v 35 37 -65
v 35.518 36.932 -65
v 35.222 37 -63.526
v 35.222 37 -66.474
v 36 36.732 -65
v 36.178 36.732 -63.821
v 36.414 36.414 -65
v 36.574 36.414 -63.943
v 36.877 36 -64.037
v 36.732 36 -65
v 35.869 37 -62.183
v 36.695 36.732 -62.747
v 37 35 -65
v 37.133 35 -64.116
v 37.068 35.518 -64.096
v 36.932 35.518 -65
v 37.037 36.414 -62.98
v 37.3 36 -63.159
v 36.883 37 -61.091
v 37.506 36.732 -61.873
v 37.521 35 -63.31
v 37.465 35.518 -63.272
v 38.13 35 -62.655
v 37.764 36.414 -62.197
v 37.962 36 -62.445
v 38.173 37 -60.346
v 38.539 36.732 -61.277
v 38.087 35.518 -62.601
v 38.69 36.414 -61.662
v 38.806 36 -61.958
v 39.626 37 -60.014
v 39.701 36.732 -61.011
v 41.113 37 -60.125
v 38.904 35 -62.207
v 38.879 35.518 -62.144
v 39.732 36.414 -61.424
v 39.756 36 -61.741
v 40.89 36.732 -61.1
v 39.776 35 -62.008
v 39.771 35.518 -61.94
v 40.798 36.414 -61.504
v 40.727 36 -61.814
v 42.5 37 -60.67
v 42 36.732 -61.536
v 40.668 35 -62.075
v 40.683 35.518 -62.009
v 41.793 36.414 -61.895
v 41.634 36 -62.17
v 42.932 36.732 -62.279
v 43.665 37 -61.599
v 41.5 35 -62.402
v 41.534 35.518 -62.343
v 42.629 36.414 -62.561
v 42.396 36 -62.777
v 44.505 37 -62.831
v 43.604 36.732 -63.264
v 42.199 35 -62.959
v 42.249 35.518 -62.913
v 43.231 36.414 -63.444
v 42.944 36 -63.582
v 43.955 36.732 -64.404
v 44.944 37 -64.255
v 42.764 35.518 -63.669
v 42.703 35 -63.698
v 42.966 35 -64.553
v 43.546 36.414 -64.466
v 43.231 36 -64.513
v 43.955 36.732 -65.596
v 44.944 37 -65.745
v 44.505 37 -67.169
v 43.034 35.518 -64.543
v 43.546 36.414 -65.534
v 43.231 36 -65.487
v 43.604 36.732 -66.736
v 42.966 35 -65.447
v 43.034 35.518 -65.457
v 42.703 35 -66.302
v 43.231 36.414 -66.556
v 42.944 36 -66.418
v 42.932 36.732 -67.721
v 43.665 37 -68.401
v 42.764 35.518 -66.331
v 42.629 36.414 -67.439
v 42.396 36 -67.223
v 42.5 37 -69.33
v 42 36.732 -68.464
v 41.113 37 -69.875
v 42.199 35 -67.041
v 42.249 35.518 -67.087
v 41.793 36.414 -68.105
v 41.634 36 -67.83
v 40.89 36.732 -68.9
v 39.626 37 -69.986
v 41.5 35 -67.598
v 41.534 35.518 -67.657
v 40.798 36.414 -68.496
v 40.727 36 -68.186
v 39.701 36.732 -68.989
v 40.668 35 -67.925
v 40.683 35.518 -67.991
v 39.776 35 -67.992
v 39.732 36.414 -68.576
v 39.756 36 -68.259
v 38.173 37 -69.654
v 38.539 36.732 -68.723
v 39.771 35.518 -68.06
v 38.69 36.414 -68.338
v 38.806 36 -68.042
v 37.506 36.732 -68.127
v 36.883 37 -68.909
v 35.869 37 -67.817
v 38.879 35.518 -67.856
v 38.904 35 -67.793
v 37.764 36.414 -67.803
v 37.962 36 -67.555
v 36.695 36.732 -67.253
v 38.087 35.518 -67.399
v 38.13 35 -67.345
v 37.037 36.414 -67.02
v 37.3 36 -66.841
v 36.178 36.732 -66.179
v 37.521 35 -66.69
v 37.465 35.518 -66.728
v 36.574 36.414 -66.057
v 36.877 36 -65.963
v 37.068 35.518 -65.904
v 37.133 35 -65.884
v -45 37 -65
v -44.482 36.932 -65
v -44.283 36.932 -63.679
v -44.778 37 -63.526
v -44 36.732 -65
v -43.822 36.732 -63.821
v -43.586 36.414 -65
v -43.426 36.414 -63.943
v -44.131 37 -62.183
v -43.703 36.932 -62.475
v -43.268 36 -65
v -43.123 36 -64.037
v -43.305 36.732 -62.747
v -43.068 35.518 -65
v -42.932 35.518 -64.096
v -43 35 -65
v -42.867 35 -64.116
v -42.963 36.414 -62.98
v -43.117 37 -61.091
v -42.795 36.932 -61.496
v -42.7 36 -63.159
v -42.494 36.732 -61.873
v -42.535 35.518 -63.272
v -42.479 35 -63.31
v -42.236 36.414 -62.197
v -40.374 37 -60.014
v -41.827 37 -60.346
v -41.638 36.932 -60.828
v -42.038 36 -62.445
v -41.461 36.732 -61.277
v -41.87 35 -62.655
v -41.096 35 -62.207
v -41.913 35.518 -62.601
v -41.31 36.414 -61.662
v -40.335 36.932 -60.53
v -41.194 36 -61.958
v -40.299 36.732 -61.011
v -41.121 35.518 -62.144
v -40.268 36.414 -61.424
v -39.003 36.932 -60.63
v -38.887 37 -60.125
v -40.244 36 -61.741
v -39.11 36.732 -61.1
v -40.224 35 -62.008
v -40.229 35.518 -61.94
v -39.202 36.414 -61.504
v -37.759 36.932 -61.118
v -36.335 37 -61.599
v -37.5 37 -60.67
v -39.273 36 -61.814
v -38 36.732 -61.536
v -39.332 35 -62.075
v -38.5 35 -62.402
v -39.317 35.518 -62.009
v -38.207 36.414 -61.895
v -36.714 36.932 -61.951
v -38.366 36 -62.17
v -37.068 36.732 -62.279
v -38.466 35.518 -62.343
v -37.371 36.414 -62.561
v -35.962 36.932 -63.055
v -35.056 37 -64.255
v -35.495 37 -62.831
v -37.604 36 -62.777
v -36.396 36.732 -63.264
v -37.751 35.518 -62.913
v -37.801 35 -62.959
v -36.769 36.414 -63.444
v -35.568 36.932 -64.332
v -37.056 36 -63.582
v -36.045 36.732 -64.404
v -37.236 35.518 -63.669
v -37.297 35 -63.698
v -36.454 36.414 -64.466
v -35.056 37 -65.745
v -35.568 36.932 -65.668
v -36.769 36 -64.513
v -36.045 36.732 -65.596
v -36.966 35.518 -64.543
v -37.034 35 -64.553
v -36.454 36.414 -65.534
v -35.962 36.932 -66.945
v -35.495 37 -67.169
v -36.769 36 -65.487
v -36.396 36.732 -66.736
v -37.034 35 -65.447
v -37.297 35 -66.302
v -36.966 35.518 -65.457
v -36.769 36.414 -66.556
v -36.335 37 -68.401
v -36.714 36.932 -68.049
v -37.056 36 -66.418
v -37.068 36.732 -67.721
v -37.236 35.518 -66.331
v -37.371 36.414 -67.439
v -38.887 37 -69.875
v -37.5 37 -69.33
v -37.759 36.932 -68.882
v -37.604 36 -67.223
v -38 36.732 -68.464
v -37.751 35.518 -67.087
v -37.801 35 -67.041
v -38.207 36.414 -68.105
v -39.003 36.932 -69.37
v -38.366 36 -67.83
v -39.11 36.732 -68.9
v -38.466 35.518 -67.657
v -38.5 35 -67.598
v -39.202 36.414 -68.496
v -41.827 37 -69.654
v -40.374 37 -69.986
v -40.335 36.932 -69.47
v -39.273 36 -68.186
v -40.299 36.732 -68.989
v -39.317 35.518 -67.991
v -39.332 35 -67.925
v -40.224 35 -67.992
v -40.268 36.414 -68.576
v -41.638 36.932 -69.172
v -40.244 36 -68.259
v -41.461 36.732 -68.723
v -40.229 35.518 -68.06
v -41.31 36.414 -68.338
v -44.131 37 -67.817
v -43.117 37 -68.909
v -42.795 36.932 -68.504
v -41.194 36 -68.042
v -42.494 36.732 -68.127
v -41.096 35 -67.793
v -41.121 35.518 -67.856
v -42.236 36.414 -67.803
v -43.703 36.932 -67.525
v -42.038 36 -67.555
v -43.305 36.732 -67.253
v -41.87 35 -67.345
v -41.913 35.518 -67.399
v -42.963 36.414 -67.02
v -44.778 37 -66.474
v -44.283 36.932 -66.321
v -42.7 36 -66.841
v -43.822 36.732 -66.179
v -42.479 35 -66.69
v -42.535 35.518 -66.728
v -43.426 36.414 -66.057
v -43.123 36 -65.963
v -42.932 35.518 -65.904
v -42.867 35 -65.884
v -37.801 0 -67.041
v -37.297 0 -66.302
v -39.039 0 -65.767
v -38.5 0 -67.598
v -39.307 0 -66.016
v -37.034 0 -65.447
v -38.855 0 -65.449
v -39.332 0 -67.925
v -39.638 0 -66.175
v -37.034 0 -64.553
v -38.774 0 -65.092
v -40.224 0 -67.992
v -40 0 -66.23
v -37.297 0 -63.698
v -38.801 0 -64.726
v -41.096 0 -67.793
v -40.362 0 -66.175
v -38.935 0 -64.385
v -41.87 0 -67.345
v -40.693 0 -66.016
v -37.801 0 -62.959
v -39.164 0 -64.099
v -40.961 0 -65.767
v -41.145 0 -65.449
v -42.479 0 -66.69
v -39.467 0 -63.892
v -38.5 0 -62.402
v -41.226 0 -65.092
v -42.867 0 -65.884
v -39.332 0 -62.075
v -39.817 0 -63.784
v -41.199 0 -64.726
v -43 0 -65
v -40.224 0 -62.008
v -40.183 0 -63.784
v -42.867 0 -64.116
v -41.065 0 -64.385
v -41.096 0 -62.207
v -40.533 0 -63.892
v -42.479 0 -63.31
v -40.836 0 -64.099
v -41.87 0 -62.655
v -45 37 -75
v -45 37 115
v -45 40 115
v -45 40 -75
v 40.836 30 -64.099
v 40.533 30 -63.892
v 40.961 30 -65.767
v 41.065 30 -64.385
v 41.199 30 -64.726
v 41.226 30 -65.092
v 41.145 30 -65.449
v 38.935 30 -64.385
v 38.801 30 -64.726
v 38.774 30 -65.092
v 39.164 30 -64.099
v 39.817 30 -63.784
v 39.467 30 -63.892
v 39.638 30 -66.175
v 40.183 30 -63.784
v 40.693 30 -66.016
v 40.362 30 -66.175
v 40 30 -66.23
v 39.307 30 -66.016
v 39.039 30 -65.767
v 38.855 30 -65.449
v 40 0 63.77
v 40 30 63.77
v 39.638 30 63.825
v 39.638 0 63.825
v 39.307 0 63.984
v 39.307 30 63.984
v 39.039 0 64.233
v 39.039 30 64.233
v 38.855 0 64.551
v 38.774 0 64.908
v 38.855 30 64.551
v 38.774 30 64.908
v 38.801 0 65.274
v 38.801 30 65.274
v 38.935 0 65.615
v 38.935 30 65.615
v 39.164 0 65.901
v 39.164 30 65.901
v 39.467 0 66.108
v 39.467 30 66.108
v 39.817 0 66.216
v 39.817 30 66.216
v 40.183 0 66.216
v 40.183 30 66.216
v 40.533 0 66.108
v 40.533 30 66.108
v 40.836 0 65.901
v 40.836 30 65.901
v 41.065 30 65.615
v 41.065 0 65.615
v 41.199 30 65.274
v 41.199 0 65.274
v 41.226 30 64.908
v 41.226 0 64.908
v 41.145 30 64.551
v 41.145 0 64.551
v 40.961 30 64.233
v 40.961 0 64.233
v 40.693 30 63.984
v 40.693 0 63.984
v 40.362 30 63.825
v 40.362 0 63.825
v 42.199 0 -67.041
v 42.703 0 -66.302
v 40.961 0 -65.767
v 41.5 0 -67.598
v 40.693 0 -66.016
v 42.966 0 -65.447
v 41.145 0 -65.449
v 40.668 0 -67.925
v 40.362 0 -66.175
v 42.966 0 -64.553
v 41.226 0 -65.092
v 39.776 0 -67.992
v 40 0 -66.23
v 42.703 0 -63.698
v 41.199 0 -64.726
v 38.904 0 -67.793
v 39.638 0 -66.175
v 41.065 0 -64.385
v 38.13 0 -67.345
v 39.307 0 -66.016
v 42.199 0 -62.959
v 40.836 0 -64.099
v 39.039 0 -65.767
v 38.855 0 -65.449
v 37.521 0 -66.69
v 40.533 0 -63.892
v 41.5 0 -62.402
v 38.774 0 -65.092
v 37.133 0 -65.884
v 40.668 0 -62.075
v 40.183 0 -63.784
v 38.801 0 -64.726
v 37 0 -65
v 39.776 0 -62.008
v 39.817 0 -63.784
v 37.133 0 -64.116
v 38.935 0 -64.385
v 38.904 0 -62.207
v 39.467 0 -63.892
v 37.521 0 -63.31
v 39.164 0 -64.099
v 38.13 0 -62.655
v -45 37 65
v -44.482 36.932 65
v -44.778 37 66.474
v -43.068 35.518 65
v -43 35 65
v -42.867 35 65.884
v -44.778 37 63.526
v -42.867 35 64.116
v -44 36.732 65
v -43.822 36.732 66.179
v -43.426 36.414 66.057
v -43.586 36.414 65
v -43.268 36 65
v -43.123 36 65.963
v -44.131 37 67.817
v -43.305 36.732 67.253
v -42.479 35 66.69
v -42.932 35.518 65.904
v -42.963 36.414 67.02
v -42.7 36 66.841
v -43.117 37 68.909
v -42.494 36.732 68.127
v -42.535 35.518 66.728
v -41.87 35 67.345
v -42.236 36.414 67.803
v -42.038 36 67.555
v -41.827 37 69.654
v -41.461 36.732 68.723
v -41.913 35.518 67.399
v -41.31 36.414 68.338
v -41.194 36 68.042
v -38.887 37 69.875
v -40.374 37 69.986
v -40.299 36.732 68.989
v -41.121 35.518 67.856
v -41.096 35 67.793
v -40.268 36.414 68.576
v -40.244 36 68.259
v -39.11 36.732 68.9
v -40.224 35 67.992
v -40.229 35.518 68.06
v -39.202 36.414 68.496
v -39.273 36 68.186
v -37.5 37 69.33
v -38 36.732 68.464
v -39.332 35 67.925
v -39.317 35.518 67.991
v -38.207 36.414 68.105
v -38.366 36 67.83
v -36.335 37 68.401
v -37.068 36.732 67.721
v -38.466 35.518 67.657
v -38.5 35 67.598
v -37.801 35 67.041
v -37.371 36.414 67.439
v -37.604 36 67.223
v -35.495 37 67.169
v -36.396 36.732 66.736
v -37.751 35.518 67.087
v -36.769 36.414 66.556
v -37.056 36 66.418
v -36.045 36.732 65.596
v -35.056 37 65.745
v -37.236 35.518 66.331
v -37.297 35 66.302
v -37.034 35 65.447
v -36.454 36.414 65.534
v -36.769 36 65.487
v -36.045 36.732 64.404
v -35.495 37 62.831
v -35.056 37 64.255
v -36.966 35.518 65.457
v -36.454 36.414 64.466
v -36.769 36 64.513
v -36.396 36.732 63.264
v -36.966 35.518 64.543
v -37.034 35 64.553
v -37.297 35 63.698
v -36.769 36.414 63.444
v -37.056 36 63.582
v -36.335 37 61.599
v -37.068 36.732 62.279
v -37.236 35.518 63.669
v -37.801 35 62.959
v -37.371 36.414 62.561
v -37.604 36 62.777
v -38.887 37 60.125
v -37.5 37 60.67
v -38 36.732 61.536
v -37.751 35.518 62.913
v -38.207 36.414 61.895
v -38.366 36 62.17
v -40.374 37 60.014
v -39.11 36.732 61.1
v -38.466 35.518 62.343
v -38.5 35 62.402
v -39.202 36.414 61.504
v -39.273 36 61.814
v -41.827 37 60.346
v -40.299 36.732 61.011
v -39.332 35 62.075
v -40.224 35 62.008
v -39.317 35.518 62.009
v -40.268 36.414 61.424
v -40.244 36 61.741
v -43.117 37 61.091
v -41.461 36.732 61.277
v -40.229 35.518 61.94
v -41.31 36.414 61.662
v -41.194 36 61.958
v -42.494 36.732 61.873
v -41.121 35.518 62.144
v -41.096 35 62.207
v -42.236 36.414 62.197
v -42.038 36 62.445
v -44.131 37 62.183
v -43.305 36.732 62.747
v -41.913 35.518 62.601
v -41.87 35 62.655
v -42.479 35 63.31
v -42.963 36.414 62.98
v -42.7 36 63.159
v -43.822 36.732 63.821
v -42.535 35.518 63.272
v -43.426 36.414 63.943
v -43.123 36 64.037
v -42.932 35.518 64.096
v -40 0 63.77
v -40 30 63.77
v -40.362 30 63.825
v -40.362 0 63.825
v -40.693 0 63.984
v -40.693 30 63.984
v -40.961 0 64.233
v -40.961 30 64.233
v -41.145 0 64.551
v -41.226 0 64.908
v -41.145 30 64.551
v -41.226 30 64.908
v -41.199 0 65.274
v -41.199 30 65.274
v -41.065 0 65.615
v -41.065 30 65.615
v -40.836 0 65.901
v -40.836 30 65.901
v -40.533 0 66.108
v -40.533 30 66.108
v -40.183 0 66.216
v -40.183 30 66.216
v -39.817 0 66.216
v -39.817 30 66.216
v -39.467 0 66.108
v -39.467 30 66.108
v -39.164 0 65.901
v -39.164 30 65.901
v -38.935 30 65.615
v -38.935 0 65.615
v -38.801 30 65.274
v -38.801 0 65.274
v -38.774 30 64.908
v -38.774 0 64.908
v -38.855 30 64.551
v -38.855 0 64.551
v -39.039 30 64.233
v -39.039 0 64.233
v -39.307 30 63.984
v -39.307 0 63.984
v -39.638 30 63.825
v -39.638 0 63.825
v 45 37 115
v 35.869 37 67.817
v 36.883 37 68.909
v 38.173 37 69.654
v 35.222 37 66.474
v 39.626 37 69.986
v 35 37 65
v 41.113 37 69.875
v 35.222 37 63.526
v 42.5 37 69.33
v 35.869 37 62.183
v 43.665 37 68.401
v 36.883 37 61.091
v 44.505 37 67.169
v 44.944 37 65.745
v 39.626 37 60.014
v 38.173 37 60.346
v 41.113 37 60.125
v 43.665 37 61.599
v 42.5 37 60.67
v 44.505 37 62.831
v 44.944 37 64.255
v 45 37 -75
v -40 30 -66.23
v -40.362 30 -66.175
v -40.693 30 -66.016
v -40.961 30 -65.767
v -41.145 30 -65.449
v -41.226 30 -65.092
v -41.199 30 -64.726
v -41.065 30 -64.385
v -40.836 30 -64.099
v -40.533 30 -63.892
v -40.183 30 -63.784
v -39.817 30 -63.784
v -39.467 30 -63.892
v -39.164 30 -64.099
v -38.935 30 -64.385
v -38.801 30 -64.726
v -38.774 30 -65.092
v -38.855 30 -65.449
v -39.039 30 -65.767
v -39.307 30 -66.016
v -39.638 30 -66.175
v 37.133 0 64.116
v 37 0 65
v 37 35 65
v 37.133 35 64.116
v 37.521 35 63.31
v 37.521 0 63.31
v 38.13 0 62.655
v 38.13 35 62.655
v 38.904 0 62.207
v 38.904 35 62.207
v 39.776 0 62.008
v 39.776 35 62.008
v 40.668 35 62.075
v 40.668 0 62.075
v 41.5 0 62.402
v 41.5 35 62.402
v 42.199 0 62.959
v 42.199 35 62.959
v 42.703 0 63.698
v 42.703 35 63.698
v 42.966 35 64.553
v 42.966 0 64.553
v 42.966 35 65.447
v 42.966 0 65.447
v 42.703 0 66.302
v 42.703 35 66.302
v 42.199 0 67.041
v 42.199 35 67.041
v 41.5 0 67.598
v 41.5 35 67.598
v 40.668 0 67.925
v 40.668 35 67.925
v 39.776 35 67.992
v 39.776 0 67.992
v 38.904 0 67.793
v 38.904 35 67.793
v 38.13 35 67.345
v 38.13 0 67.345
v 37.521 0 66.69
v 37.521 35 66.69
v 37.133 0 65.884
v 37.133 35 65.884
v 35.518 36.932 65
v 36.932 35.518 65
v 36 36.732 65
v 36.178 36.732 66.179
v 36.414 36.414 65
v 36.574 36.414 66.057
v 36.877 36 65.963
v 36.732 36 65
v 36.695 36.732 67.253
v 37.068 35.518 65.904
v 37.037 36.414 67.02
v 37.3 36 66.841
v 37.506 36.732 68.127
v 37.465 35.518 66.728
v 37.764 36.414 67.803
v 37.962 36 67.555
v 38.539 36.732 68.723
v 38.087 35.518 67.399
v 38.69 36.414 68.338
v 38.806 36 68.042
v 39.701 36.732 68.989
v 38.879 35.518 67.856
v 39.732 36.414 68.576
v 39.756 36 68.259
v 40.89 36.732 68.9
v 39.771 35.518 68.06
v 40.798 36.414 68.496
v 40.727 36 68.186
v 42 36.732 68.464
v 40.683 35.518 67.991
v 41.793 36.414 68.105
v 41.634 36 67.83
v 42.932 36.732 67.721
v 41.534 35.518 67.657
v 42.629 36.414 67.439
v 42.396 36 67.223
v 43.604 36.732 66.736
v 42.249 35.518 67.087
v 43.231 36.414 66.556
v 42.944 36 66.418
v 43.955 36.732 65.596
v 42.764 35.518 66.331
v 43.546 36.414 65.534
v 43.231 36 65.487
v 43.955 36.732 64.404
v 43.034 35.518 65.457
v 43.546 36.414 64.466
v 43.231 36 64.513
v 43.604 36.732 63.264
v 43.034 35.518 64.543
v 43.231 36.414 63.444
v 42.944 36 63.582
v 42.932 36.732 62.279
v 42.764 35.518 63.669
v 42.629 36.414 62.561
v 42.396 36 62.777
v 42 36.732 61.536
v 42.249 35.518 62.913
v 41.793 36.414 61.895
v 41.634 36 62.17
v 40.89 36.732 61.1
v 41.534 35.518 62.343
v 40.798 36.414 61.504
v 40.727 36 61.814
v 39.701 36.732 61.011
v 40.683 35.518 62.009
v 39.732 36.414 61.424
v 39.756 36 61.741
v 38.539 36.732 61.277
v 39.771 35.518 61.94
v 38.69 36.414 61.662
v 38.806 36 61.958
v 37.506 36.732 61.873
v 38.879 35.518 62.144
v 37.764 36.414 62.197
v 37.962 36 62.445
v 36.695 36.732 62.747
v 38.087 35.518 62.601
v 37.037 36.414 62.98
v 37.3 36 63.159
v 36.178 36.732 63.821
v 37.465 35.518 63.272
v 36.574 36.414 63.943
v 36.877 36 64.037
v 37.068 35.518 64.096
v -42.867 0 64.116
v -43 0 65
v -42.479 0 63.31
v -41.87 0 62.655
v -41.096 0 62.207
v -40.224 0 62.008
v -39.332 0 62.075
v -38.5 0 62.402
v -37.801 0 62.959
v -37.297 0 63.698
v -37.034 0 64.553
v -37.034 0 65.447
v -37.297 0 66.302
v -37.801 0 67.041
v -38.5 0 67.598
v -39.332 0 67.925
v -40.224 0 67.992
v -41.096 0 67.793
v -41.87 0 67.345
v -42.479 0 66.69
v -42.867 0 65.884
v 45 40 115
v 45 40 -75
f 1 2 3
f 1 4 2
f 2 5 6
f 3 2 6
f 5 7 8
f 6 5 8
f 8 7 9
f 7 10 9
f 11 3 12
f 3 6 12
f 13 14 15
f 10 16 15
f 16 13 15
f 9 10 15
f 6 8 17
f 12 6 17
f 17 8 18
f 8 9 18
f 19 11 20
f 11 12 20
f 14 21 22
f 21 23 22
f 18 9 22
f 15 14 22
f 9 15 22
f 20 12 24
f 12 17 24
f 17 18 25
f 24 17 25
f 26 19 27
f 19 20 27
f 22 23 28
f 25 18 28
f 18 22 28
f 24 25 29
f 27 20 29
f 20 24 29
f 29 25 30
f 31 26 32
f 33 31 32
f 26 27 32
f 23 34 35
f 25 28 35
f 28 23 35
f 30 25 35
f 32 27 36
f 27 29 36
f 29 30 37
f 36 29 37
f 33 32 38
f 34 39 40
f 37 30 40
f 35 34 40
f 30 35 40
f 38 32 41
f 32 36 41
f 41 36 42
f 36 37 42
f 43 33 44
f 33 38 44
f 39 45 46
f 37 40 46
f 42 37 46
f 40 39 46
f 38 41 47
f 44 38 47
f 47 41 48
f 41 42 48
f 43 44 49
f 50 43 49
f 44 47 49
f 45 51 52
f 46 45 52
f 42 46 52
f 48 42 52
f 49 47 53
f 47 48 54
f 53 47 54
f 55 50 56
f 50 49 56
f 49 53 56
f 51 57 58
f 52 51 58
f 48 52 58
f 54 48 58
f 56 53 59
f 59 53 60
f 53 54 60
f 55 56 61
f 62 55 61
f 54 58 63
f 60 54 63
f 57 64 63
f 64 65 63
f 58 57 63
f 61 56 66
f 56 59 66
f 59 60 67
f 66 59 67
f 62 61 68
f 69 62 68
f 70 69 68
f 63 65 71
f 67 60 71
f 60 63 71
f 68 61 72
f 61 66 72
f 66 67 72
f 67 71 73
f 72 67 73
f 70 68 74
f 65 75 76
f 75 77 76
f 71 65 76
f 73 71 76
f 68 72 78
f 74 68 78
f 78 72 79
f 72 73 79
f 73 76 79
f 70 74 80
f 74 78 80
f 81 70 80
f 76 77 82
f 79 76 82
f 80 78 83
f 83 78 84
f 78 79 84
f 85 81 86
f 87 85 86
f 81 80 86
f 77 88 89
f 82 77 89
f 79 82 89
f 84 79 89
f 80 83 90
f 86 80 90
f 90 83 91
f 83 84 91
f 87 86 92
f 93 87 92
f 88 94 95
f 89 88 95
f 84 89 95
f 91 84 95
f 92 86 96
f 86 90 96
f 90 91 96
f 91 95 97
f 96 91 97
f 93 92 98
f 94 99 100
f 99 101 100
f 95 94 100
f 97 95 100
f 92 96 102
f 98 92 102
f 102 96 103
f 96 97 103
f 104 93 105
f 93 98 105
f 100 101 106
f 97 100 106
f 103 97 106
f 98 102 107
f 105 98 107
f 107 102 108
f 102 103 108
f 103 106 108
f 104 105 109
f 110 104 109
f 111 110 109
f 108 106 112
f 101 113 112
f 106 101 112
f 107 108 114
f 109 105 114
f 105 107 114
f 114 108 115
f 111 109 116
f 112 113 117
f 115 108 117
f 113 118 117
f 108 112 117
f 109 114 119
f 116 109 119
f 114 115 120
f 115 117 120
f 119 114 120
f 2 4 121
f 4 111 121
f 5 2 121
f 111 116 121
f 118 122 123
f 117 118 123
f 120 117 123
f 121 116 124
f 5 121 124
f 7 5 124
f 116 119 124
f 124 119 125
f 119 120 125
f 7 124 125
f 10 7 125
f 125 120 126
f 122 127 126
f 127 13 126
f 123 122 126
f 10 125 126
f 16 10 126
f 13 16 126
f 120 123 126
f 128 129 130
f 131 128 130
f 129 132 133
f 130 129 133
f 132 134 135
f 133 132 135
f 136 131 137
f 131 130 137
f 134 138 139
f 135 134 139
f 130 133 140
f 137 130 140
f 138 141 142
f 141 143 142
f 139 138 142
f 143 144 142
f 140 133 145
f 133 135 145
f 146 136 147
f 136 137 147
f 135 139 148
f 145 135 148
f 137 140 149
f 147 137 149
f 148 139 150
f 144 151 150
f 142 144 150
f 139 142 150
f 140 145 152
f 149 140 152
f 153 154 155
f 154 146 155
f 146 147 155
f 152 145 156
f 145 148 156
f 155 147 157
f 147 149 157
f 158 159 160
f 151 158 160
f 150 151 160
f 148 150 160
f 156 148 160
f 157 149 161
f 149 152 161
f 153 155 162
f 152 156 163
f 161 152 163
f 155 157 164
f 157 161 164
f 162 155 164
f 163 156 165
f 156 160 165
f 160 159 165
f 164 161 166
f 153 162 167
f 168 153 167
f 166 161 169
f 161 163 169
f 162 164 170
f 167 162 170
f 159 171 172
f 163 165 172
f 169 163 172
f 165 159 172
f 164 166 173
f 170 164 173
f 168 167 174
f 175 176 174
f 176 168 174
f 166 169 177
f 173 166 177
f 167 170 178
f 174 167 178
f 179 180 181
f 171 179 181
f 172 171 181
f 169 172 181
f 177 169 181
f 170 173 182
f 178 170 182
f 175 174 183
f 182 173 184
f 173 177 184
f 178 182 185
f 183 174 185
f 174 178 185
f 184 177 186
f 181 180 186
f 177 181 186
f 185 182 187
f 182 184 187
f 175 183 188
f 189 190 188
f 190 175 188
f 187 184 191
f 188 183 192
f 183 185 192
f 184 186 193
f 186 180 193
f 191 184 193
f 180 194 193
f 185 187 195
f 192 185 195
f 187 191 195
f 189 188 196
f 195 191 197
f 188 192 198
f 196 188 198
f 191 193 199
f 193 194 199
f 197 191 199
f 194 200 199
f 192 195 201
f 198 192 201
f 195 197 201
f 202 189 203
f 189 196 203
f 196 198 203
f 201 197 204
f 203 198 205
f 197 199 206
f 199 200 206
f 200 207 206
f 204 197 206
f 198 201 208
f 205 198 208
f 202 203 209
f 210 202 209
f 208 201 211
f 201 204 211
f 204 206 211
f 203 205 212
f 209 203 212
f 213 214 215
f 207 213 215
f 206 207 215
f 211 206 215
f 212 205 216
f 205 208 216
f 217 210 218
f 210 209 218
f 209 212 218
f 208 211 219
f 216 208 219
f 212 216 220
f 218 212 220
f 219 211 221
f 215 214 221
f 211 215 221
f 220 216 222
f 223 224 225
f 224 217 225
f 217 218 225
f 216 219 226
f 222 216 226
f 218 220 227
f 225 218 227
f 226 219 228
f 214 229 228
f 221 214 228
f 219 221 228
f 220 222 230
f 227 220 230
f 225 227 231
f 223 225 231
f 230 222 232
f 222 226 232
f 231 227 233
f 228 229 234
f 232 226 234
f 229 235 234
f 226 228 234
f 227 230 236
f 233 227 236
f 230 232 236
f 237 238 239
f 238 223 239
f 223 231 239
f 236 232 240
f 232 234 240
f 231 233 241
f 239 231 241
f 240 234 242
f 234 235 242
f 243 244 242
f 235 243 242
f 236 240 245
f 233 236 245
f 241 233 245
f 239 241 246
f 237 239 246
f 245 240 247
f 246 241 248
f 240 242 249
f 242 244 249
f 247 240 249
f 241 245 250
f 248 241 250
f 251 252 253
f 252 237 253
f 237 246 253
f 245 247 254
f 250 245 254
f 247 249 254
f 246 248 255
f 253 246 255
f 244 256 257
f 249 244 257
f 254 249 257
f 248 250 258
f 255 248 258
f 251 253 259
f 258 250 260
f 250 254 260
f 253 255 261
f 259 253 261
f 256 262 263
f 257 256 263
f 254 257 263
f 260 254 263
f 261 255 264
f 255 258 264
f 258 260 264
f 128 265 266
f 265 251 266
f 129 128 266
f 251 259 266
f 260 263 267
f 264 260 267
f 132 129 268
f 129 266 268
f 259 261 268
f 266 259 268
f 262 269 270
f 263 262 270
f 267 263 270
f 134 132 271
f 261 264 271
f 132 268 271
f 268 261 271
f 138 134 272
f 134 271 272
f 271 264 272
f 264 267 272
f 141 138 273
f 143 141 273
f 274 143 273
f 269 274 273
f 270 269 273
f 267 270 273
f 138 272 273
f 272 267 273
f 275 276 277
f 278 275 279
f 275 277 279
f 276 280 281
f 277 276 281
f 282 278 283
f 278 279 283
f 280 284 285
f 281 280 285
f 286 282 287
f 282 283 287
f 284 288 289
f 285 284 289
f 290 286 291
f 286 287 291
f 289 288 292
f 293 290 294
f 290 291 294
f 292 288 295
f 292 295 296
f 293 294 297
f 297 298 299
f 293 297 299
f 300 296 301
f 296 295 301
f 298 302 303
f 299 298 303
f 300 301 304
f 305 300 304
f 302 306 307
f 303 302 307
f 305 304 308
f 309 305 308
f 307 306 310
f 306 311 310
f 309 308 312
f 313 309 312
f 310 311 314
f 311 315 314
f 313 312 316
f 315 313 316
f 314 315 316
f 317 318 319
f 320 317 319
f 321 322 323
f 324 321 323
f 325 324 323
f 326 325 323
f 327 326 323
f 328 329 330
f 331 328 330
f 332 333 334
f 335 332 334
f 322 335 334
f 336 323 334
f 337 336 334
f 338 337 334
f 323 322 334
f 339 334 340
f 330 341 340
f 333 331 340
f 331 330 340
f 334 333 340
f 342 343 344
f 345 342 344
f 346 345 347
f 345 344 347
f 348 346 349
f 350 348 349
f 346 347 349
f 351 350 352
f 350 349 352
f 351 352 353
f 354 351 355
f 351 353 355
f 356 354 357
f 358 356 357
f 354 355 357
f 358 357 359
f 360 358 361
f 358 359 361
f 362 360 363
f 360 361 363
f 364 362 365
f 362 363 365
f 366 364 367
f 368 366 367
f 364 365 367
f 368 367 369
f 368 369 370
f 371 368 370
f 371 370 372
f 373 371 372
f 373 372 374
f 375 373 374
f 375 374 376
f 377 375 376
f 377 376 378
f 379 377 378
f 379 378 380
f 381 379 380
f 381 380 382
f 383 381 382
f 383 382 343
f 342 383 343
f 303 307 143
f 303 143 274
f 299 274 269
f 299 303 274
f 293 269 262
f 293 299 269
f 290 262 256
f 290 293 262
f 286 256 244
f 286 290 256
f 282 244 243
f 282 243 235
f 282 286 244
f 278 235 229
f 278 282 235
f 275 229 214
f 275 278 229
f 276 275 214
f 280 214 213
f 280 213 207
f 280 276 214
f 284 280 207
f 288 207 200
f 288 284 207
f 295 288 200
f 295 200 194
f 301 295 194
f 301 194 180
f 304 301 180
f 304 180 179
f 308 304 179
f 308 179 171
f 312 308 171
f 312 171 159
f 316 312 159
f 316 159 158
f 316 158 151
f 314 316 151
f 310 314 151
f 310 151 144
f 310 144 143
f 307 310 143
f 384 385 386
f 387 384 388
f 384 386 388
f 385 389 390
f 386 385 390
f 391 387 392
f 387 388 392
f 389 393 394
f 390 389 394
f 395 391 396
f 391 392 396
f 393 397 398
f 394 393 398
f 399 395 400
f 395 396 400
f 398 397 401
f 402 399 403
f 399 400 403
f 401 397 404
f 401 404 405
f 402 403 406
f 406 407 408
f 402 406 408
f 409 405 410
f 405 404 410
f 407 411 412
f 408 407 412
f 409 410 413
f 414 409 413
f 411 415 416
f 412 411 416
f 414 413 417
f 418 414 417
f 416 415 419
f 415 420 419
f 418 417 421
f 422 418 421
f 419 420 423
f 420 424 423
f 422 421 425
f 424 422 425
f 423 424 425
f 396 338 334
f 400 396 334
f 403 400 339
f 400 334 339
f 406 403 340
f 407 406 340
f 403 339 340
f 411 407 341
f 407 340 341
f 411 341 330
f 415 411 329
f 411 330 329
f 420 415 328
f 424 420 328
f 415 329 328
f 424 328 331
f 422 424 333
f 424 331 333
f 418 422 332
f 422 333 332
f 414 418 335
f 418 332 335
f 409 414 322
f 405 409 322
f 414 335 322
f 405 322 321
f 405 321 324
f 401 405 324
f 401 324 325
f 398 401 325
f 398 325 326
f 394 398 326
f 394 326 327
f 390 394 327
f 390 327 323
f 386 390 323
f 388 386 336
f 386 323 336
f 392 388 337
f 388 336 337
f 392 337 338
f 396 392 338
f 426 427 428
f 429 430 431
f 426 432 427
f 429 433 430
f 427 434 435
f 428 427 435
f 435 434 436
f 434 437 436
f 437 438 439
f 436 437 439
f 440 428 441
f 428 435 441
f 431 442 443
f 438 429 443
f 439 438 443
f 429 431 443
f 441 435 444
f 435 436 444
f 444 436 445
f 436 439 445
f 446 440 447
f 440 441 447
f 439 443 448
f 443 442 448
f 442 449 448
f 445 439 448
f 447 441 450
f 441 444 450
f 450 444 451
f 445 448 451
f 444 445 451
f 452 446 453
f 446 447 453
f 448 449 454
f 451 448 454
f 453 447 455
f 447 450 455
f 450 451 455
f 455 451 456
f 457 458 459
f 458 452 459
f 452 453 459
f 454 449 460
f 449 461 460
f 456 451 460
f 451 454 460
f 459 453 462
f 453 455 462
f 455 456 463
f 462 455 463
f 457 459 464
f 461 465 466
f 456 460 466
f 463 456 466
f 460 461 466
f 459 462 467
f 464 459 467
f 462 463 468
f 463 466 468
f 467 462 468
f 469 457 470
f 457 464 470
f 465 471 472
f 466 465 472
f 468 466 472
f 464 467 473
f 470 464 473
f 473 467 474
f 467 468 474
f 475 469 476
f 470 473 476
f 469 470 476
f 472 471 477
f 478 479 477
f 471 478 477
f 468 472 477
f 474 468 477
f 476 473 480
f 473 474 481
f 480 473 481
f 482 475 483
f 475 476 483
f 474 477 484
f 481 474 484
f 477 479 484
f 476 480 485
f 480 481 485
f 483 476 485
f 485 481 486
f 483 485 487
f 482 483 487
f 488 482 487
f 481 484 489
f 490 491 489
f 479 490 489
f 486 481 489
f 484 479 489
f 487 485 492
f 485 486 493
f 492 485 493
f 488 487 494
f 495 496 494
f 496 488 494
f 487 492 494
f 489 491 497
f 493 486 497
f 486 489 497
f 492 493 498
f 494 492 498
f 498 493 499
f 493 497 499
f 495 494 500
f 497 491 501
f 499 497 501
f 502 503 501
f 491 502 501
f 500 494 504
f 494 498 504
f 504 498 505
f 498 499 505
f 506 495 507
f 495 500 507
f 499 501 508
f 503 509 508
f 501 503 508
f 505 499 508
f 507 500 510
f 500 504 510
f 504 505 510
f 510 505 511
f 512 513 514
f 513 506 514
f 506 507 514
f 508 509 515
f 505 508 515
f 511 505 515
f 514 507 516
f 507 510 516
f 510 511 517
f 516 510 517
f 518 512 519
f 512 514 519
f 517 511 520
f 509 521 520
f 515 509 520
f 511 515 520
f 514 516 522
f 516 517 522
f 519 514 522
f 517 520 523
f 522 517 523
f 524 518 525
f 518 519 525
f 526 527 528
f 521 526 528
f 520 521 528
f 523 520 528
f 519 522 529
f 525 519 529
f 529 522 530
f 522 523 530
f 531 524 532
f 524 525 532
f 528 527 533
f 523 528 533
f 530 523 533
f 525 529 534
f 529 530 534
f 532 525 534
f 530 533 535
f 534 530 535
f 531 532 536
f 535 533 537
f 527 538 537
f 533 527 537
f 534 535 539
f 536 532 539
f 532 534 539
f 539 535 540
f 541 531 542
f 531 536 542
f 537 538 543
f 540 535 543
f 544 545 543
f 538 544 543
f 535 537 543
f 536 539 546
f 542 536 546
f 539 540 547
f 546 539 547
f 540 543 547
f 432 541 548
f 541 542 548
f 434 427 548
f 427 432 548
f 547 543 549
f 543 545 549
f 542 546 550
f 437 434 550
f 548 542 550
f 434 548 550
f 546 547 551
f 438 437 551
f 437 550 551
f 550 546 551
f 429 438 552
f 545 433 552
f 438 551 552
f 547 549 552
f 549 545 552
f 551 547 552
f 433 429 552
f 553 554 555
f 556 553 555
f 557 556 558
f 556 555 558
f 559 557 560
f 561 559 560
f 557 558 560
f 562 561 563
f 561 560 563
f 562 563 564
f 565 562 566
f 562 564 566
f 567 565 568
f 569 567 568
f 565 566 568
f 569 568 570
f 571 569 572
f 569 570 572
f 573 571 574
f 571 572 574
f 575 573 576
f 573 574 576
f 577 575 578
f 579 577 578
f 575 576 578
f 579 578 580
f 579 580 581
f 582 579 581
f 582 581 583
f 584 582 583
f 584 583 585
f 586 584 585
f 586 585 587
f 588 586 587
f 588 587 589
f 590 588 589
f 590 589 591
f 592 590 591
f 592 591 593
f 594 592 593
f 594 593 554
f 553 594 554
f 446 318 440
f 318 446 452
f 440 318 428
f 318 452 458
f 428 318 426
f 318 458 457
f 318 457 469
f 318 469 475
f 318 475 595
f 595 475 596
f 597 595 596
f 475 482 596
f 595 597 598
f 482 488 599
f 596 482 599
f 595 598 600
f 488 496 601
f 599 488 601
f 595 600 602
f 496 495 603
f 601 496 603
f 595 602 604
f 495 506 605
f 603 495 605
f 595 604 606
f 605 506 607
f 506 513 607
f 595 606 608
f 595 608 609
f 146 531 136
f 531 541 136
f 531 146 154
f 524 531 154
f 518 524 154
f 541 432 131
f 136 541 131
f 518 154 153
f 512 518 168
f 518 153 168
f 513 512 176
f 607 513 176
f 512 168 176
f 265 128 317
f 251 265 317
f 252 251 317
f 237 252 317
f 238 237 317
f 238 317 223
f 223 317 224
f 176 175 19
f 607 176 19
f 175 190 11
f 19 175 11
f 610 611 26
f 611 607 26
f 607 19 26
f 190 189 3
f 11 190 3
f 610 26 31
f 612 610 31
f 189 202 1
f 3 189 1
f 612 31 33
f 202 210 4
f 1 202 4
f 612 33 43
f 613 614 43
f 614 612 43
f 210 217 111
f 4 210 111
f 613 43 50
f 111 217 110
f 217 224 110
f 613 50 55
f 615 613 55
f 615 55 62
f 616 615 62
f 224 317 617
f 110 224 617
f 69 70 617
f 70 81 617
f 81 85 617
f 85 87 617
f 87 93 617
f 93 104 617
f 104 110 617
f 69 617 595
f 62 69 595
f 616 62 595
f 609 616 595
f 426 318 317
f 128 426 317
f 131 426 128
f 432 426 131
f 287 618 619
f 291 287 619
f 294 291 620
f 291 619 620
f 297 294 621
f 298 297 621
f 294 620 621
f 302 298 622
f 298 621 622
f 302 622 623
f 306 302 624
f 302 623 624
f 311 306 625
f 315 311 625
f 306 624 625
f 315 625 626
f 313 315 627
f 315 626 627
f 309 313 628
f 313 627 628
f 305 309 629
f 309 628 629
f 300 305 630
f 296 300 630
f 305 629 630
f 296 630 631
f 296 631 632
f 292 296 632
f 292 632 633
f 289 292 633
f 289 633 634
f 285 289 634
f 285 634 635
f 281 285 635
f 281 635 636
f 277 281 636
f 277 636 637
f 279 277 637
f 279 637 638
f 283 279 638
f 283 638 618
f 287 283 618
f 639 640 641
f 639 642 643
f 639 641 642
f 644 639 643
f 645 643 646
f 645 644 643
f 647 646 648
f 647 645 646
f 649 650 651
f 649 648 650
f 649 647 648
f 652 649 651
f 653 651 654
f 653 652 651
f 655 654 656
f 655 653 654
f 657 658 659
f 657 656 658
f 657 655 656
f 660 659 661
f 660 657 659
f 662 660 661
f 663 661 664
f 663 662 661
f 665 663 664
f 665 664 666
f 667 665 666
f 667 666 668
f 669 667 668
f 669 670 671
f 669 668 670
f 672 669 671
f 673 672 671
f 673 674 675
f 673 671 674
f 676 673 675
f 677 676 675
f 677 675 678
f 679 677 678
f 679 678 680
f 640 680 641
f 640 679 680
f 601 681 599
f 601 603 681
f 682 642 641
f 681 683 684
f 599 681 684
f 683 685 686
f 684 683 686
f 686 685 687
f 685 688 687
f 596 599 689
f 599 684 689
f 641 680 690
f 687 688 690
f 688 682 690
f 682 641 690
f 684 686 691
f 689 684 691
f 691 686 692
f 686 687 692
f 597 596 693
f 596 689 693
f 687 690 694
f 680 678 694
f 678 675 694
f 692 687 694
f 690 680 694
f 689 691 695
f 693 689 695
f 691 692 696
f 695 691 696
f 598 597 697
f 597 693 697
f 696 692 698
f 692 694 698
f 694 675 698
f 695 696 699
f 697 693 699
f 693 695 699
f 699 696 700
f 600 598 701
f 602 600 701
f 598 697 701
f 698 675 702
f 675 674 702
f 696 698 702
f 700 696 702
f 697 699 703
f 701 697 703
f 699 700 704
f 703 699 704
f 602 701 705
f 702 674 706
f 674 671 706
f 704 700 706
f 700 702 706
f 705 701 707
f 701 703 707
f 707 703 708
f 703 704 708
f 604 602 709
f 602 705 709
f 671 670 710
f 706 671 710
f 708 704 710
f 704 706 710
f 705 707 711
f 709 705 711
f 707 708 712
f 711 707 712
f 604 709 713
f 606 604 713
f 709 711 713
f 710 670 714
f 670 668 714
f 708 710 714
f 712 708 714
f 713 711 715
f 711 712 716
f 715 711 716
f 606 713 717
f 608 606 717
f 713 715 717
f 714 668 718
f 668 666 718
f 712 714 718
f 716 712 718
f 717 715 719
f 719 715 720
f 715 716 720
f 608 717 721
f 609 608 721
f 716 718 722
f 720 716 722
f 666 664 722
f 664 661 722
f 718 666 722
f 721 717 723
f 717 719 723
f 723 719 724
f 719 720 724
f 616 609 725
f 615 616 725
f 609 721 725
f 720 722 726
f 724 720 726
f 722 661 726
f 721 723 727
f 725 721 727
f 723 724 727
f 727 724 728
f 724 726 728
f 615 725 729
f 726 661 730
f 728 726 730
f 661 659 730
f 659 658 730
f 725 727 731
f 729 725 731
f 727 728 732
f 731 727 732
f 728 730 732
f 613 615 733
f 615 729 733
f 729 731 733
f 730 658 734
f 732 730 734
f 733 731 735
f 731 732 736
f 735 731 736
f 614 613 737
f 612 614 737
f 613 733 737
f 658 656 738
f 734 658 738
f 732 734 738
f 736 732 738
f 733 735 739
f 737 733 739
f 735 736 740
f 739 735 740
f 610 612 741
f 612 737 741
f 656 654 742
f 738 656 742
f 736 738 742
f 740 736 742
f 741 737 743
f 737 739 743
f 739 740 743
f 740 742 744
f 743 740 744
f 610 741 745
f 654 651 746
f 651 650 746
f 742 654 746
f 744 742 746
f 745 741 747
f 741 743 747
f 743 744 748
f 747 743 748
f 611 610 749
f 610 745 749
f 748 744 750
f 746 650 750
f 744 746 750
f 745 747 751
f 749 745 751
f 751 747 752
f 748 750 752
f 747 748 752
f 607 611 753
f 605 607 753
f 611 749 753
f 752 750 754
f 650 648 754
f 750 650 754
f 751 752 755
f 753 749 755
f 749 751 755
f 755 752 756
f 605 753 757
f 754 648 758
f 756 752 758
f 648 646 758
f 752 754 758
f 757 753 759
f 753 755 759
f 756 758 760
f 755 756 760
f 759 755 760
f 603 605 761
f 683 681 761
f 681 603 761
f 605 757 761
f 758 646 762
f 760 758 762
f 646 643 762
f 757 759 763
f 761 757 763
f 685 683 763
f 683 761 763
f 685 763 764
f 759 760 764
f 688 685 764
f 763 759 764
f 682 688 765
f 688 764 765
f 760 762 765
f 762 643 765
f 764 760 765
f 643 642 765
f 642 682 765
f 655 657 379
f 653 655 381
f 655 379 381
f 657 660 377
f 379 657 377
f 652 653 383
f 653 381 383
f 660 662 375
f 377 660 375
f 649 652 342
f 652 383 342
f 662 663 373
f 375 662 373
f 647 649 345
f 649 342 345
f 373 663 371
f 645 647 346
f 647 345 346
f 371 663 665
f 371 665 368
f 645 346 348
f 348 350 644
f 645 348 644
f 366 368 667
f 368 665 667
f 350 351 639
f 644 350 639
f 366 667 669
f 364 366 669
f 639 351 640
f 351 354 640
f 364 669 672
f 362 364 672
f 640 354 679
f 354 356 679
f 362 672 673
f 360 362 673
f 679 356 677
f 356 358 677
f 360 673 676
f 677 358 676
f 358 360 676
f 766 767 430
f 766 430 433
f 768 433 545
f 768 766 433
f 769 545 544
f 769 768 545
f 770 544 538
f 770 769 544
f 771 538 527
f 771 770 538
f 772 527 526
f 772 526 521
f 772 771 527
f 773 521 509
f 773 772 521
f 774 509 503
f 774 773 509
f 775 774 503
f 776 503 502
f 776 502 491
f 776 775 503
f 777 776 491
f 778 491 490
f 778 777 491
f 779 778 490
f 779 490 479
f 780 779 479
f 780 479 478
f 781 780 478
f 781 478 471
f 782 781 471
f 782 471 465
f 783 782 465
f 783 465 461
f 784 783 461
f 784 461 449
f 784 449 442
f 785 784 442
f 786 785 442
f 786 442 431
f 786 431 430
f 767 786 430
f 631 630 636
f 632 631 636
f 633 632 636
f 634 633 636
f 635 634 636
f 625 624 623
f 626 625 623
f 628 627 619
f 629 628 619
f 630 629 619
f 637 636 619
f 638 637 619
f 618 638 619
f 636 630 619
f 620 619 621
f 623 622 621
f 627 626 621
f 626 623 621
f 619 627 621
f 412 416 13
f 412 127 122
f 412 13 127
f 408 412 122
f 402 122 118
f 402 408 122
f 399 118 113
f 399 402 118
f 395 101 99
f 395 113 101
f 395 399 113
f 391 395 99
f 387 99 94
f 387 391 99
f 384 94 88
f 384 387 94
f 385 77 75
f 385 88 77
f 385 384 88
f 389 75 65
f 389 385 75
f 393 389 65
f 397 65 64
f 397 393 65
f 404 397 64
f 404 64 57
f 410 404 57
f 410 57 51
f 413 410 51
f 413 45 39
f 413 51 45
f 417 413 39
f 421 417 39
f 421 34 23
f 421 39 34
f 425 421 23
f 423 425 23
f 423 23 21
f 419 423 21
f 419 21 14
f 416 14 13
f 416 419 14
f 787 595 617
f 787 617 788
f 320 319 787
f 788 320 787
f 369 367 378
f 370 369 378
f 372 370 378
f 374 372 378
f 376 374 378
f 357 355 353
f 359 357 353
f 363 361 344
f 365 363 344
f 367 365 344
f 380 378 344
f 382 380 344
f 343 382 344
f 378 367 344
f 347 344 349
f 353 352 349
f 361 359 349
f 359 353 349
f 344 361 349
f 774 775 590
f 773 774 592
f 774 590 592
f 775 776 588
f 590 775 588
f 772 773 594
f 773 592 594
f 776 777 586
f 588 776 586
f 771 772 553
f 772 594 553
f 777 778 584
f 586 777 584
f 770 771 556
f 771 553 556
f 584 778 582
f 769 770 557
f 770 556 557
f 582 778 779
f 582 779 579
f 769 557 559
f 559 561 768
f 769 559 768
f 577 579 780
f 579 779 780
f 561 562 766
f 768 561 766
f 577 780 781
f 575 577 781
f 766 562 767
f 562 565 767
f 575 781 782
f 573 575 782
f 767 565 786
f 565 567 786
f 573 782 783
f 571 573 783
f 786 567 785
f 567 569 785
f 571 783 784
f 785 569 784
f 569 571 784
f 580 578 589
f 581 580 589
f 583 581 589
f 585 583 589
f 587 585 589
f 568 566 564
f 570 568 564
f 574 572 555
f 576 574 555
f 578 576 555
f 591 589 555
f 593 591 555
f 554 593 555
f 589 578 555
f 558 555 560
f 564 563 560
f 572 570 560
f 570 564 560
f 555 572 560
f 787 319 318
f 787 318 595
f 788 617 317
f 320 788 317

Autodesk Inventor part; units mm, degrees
ref_plane "YZ Plane" through (0, 0, 0) normal (1, 0, 0) x (0, 1, 0)
ref_plane "XZ Plane" through (0, 0, 0) normal (0, 1, 0) x (-1, 0, 0)
ref_plane "XY Plane" through (0, 0, 0) normal (0, 0, 1) x (1, 0, 0)
sketch "Esquisse1" plane through (0, 0, 0) normal (0, 1, 0) x (-1, 0, 0)
  line L0 (0, 0) -> (0, 65)
  line L1 (0, 0) -> (0, -65)
  line L2 (0, 65) -> (40, 65)
  line L3 (-40, -65) -> (40, -65)
  circle A0 centre (40, 65) radius 3
  circle A1 centre (40, -65) radius 3
  circle A2 centre (-40, -65) radius 3
  line L4 (0, 65) -> (-40, 65)
  circle A3 centre (-40, 65) radius 3
  dimension "d0" = 65
  dimension "d1" = 65
  dimension "d2" = 40
  dimension "d4" = 80
  dimension "d5" = 6
  dimension "d7" = 6
  dimension "d9" = 6
  dimension "d11" = 40
  dimension "d12" = 6
extrude "Extrusion1" add sketch "Esquisse1" along normal blind 37
sketch "Esquisse2" plane through (-40, 37, 65) normal (0, 1, 0) x (1, 0, 0)
  line L0 (0, 0) -> (80, 0)
  line L1 (80, 0) -> (80, 130)
  line L2 (80, 130) -> (0, 130)
  line L3 (0, 130) -> (0, 0)
  line L4 (0, 0) -> (0, -10)
  line L5 (0, -10) -> (85, -10)
  line L6 (85, -10) -> (85, 140)
  line L7 (85, 140) -> (-5, 140)
  line L8 (-5, 140) -> (-5, -10)
  line L9 (-5, -10) -> (0, -10)
  point P0 (40, 65)
  dimension "d16" = 80
  dimension "d17" = 130
  dimension "d18" = 10
  dimension "d19" = 85
  dimension "d20" = 150
  dimension "d21" = 90
extrude "Extrusion2" add sketch "Esquisse2" along normal blind 3 contours L3 L2 L1 L0 | L9 L8 L7 L6 L5
sketch "Esquisse3" plane through (40, 0, 65) normal (0, -1, 0) x (1, 0, 0)
  circle A0 centre (0, -130) radius 3 projected
  circle A1 centre (-80, 0) radius 3 projected
  circle A2 centre (-80, -130) radius 3 projected
  point P0 (-40, -65)
  point P1 (0, 0)
hole "Perçage1" at (40, 0, 65) at (40, 0, -65) at (-40, 0, 65) at (-40, 0, -65) direction (0, 1, 0) diameter 2.459 depth 30 thread size "M3x0.5" class "6H" standard "ISO Metric profile"
sketch "Esquisse4" plane through (-45, 37, 75) normal (0, 0, 1) x (1, 0, 0)
  line L0 (0, 0) -> (90, 0) projected
  line L1 (90, 0) -> (90, 3) projected
  line L2 (0, 3) -> (90, 3) projected
  line L3 (0, 0) -> (0, 3) projected
  point P0 (45, -37)
extrude "Extrusion3" add sketch "Esquisse4" along normal blind 40
fillet "Congé1" radius 2 4 edges at (-37, 37, 65) (43, 37, 65) (43, 37, -65) (-37, 37, -65)
properties part number "Support intérieur châssis"
